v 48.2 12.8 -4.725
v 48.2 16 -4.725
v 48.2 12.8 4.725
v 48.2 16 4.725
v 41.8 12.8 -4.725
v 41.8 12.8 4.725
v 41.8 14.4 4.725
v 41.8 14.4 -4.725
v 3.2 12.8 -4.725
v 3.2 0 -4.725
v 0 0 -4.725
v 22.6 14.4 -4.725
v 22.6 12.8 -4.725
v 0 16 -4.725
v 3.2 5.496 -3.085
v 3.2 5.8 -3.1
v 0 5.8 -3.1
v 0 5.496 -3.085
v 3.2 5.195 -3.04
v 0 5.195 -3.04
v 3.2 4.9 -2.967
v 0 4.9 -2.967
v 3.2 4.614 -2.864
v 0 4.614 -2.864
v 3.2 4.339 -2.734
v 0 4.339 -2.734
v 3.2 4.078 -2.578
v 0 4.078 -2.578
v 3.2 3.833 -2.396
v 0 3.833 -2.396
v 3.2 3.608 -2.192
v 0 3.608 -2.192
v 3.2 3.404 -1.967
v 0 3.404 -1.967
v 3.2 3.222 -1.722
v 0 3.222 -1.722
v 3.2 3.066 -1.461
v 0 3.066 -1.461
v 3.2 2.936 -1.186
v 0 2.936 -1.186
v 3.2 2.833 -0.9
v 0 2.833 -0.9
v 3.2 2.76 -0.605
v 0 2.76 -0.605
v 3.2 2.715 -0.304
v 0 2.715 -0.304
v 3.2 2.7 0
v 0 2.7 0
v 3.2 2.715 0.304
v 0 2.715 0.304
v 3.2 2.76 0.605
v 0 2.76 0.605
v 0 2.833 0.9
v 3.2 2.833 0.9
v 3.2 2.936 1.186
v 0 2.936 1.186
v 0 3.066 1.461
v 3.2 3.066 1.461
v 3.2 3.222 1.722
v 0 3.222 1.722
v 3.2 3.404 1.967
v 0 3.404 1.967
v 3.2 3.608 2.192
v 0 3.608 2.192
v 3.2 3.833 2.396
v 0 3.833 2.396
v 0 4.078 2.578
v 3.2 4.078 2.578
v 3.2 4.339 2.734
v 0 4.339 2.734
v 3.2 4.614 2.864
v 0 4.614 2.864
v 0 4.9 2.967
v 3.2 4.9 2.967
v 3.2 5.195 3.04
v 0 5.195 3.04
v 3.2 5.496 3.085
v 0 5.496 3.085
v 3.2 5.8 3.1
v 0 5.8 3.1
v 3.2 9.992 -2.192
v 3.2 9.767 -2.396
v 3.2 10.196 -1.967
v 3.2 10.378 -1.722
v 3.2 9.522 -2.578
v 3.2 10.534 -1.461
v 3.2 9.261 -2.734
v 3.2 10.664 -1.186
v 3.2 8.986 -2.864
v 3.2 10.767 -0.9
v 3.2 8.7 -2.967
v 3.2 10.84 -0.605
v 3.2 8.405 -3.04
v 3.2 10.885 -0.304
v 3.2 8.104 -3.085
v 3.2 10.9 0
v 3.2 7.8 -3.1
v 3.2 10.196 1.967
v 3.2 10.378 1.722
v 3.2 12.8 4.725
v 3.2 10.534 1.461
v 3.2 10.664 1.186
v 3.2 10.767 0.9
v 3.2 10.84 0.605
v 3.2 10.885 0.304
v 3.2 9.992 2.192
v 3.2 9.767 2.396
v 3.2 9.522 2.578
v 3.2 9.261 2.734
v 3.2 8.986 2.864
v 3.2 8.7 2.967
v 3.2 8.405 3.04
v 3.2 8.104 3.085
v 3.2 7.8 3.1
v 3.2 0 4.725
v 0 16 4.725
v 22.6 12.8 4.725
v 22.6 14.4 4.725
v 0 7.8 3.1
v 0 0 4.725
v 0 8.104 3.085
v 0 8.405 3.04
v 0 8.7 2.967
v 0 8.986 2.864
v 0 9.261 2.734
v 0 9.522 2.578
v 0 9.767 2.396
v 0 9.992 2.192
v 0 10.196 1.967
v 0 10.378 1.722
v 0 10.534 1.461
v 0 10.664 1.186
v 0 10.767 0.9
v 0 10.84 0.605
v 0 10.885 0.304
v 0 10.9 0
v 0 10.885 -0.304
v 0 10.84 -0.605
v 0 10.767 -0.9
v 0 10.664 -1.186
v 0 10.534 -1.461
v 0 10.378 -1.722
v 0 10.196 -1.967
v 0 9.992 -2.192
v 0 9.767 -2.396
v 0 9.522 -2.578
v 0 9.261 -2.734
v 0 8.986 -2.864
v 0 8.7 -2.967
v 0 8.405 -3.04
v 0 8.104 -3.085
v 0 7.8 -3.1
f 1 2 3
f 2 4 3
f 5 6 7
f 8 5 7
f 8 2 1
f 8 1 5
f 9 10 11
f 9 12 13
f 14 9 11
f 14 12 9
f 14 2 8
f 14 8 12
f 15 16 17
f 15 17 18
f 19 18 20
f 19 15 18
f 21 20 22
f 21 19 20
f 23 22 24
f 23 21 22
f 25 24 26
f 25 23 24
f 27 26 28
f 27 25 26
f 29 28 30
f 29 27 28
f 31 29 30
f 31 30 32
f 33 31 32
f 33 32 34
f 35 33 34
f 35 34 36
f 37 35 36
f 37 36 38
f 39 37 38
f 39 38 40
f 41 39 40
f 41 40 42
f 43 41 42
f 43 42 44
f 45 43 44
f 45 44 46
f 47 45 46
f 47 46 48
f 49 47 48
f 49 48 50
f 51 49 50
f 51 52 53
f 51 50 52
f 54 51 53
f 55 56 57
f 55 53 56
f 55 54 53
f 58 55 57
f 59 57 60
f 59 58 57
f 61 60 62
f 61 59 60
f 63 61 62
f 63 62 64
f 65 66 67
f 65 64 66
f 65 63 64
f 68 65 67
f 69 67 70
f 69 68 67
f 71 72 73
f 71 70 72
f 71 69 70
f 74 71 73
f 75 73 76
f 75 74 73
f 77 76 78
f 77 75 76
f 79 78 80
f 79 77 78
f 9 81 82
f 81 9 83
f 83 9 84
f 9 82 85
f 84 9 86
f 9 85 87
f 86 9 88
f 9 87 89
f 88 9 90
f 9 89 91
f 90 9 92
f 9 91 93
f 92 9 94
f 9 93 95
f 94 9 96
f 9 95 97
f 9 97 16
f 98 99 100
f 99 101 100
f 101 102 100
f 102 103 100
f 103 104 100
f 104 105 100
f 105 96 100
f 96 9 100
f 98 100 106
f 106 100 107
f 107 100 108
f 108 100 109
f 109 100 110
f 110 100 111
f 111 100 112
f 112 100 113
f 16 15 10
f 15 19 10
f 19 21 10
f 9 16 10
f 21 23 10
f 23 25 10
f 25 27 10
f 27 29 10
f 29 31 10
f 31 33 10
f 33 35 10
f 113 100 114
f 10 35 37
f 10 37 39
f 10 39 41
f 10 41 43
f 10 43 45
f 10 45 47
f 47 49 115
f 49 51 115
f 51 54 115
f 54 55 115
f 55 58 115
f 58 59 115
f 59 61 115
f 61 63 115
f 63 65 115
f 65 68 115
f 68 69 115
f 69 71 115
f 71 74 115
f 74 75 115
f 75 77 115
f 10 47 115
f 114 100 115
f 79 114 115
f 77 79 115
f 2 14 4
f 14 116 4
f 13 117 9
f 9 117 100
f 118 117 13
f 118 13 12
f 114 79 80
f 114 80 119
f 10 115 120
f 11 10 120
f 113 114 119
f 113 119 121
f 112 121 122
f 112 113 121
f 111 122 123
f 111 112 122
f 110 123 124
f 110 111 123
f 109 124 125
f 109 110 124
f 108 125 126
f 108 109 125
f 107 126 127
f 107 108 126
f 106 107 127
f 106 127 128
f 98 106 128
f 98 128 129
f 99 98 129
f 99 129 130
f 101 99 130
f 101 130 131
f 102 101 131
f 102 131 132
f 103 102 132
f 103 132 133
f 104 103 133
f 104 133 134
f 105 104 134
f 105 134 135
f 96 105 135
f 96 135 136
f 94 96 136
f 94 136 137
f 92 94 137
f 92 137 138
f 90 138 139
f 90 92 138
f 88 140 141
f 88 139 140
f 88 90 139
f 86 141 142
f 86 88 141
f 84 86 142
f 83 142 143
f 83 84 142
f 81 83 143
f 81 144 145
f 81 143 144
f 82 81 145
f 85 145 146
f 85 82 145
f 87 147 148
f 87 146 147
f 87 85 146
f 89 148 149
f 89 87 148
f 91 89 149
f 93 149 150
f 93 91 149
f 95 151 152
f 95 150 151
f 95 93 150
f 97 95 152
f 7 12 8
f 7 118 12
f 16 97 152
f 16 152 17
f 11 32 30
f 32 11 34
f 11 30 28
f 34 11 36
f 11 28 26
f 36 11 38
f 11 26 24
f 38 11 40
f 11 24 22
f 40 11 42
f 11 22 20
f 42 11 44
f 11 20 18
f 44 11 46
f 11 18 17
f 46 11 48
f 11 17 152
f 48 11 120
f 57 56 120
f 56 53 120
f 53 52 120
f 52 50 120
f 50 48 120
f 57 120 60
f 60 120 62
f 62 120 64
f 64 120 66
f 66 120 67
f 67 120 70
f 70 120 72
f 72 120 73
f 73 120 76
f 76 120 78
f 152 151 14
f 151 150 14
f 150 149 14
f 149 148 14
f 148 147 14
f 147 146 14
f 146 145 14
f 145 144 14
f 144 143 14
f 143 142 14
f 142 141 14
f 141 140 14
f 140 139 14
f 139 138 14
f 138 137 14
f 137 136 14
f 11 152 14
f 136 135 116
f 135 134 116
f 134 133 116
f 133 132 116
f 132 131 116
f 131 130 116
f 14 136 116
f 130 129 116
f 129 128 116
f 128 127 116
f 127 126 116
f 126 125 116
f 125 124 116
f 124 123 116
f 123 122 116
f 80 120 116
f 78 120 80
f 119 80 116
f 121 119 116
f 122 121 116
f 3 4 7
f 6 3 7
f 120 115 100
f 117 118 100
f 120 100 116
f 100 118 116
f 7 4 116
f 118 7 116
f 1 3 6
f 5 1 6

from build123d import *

# Parameters (mm, degrees)
BOSS_EXTRUDE1_DEPTH = 4.725
SKETCH2_W           = 19.2
SKETCH2_H           = 1.6
CUT_EXTRUDE1_DEPTH  = 4.725
CUT_EXTRUDE2_REACH  = 49.993


with BuildPart() as part:
    # Sketch1 → Boss-Extrude1 (new, symmetric)
    with BuildSketch(Plane.XY):
        Polygon((0, 0), (0, 16), (48.2, 16), (48.2, 12.8), (3.2, 12.8), (3.2, 0), align=None)
    extrude(amount=BOSS_EXTRUDE1_DEPTH, both=True)

    # Sketch2 → Cut-Extrude1 (cut, symmetric)
    with BuildSketch(Plane.XY):
        with Locations((32.2, 13.6)):
            Rectangle(SKETCH2_W, SKETCH2_H)
    extrude(amount=CUT_EXTRUDE1_DEPTH, both=True, mode=Mode.SUBTRACT)

    # Sketch3 → Cut-Extrude2 (cut, up to next)
    with BuildSketch(Plane(origin=(3.2, 0, 0), x_dir=(0, 0, -1), z_dir=(1, 0, 0)), mode=Mode.PRIVATE) as cut_extrude2_sk1:
        with BuildLine():
            Line((-3.1, 5.8), (-3.1, 7.8))
            ThreePointArc((-3.1, 7.8), (0, 10.9), (3.1, 7.8))
            Line((3.1, 7.8), (3.1, 5.8))
            ThreePointArc((3.1, 5.8), (0, 2.7), (-3.1, 5.8))
        make_face()
    cut_extrude2_tool1 = extrude(cut_extrude2_sk1.sketch, amount=-CUT_EXTRUDE2_REACH, mode=Mode.PRIVATE) & part.part
    add(cut_extrude2_tool1.solids().sort_by_distance((3.2, 6.8, 0))[0], mode=Mode.SUBTRACT)


solid = part.part
